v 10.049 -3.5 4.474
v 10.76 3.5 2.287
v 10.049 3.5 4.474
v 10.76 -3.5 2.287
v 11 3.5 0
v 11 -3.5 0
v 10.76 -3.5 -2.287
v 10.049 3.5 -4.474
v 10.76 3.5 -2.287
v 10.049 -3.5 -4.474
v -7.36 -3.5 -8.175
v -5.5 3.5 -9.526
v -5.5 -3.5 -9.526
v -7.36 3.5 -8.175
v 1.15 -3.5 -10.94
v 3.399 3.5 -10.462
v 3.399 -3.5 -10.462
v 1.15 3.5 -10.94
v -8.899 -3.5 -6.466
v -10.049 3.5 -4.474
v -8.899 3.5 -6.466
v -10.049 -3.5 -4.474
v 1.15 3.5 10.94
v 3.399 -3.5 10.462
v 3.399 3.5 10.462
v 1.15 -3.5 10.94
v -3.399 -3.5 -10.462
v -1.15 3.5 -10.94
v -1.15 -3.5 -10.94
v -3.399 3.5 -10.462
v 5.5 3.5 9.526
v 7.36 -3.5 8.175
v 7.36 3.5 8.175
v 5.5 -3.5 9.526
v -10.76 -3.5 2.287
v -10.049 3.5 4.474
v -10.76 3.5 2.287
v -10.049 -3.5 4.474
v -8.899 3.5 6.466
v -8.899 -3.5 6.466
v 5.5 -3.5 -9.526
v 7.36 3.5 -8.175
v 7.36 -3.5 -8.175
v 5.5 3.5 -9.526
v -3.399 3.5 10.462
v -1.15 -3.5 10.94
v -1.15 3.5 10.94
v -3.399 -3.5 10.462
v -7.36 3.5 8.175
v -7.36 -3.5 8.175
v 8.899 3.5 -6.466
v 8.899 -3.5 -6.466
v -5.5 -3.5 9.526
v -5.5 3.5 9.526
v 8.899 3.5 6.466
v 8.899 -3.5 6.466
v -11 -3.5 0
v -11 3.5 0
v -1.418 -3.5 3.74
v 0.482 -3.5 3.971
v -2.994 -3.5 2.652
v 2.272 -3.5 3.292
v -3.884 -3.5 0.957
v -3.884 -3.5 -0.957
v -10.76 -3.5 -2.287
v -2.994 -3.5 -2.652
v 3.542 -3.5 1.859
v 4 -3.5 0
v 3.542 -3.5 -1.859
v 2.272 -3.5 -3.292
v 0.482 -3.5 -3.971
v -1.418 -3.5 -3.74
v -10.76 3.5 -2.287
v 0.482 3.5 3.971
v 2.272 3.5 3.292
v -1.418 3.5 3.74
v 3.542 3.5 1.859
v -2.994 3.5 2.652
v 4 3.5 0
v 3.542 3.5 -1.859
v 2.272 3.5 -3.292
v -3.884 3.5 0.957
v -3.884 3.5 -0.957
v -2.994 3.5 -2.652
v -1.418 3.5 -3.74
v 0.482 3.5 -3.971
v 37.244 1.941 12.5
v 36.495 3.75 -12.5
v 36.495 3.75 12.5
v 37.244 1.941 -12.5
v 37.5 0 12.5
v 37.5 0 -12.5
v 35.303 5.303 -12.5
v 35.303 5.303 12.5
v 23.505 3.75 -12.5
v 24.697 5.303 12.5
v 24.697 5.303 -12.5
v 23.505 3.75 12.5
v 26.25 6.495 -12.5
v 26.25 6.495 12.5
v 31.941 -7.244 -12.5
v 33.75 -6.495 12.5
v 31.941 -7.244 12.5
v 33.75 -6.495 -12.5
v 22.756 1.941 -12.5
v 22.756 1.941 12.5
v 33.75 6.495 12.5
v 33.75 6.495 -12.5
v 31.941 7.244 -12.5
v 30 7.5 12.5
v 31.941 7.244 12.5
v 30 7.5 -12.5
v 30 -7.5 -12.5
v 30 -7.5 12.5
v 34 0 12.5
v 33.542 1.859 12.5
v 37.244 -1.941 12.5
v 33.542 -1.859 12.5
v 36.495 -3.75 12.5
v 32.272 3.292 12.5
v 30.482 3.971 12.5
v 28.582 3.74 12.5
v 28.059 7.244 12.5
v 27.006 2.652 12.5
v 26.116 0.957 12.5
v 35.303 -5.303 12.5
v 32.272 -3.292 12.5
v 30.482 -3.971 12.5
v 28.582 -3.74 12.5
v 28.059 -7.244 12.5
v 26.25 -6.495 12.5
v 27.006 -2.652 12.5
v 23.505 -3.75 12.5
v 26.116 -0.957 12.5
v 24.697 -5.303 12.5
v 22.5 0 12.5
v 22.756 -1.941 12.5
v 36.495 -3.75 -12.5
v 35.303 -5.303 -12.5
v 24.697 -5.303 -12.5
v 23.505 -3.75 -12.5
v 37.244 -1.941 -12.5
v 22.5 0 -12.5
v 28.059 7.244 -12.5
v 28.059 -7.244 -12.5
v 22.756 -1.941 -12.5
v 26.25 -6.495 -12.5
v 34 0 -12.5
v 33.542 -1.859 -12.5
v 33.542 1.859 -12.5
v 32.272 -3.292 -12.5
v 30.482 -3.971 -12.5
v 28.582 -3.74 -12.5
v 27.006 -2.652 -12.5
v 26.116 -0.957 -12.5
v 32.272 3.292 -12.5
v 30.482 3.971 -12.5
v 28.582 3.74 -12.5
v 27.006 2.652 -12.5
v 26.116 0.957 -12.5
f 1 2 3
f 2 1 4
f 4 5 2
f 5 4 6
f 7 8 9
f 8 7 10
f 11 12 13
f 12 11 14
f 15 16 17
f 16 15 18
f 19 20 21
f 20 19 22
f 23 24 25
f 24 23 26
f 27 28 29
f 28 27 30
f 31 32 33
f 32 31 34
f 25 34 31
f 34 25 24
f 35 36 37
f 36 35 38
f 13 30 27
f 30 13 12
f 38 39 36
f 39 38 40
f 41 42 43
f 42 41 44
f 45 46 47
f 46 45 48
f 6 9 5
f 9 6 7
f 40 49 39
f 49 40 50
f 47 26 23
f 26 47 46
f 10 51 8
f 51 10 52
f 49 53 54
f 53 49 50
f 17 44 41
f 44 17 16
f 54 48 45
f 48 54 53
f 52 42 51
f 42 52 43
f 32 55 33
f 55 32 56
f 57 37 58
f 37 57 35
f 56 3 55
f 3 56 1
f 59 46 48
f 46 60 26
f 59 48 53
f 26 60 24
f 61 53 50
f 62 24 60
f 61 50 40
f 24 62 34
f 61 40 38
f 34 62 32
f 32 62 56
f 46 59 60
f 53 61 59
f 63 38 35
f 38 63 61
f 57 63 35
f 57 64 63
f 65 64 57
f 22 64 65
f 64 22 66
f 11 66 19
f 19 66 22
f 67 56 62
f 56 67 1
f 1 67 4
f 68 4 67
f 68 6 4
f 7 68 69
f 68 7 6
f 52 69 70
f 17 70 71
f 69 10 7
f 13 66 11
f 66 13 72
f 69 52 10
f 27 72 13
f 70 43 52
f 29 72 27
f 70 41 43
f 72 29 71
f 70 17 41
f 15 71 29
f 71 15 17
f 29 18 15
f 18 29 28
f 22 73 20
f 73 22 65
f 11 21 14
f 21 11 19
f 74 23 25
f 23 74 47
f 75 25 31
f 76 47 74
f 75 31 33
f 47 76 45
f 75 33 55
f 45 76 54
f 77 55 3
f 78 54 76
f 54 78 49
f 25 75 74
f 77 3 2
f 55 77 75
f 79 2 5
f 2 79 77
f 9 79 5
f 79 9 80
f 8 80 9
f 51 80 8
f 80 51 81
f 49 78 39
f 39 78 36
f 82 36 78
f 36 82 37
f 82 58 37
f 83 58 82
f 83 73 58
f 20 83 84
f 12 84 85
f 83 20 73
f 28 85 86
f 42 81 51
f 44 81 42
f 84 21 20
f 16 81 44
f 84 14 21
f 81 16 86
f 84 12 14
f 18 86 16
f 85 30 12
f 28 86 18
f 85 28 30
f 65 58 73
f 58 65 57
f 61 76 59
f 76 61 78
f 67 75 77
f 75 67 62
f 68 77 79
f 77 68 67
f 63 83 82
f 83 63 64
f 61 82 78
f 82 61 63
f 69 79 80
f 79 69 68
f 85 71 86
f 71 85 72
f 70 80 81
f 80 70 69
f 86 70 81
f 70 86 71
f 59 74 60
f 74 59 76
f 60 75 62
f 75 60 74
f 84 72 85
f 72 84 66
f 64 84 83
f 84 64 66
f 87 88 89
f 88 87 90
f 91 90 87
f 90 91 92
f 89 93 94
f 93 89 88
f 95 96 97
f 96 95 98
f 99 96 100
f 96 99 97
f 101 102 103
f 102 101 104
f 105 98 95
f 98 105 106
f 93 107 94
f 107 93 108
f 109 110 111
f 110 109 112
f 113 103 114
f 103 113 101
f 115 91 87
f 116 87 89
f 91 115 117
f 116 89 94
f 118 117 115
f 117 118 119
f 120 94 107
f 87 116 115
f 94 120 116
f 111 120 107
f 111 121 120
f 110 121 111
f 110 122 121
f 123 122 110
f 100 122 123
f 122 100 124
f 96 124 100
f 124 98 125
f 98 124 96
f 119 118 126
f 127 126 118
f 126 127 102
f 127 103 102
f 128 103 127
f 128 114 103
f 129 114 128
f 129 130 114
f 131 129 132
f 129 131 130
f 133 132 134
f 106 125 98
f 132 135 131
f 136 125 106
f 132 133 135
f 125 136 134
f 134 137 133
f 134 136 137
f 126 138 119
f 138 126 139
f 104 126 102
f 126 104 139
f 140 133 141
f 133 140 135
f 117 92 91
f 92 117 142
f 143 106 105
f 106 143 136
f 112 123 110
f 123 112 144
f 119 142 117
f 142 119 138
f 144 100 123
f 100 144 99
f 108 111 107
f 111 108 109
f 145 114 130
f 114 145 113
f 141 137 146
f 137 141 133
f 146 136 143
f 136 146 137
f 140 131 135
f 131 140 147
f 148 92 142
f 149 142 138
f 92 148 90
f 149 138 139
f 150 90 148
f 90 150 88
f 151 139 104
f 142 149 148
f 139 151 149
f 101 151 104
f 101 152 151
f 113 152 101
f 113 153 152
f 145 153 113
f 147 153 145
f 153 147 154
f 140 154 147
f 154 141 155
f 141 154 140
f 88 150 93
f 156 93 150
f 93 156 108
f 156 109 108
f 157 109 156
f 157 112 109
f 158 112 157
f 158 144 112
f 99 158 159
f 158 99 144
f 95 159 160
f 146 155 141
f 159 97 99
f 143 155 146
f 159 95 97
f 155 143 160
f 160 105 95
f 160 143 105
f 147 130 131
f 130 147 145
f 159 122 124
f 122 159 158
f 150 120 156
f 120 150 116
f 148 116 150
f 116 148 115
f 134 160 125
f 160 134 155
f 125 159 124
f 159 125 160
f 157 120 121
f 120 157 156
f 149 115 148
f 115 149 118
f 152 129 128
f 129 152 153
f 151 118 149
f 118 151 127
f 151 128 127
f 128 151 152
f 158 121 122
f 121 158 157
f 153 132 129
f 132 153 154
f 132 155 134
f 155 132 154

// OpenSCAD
steel = [0.8, 0.8, 0.9];

module bearing(id, od, w) {
    color(steel) rotate([90, 0, 0]) difference() {
		cylinder(h=w, r=od/2, center=true);
		cylinder(h=w*2, r=id/2, center=true);
    }
}

bearing(8, 22, 7); // 608 skateboard ball bearing.

module lm8uu() {
    color(steel) difference() {
        cylinder(h=25, r=7.5, center=true);
        cylinder(h=30, r=4, center=true);
    }
}

translate([30, 0, 0]) lm8uu(); // Linear bearing for 8mm smooth rod.
